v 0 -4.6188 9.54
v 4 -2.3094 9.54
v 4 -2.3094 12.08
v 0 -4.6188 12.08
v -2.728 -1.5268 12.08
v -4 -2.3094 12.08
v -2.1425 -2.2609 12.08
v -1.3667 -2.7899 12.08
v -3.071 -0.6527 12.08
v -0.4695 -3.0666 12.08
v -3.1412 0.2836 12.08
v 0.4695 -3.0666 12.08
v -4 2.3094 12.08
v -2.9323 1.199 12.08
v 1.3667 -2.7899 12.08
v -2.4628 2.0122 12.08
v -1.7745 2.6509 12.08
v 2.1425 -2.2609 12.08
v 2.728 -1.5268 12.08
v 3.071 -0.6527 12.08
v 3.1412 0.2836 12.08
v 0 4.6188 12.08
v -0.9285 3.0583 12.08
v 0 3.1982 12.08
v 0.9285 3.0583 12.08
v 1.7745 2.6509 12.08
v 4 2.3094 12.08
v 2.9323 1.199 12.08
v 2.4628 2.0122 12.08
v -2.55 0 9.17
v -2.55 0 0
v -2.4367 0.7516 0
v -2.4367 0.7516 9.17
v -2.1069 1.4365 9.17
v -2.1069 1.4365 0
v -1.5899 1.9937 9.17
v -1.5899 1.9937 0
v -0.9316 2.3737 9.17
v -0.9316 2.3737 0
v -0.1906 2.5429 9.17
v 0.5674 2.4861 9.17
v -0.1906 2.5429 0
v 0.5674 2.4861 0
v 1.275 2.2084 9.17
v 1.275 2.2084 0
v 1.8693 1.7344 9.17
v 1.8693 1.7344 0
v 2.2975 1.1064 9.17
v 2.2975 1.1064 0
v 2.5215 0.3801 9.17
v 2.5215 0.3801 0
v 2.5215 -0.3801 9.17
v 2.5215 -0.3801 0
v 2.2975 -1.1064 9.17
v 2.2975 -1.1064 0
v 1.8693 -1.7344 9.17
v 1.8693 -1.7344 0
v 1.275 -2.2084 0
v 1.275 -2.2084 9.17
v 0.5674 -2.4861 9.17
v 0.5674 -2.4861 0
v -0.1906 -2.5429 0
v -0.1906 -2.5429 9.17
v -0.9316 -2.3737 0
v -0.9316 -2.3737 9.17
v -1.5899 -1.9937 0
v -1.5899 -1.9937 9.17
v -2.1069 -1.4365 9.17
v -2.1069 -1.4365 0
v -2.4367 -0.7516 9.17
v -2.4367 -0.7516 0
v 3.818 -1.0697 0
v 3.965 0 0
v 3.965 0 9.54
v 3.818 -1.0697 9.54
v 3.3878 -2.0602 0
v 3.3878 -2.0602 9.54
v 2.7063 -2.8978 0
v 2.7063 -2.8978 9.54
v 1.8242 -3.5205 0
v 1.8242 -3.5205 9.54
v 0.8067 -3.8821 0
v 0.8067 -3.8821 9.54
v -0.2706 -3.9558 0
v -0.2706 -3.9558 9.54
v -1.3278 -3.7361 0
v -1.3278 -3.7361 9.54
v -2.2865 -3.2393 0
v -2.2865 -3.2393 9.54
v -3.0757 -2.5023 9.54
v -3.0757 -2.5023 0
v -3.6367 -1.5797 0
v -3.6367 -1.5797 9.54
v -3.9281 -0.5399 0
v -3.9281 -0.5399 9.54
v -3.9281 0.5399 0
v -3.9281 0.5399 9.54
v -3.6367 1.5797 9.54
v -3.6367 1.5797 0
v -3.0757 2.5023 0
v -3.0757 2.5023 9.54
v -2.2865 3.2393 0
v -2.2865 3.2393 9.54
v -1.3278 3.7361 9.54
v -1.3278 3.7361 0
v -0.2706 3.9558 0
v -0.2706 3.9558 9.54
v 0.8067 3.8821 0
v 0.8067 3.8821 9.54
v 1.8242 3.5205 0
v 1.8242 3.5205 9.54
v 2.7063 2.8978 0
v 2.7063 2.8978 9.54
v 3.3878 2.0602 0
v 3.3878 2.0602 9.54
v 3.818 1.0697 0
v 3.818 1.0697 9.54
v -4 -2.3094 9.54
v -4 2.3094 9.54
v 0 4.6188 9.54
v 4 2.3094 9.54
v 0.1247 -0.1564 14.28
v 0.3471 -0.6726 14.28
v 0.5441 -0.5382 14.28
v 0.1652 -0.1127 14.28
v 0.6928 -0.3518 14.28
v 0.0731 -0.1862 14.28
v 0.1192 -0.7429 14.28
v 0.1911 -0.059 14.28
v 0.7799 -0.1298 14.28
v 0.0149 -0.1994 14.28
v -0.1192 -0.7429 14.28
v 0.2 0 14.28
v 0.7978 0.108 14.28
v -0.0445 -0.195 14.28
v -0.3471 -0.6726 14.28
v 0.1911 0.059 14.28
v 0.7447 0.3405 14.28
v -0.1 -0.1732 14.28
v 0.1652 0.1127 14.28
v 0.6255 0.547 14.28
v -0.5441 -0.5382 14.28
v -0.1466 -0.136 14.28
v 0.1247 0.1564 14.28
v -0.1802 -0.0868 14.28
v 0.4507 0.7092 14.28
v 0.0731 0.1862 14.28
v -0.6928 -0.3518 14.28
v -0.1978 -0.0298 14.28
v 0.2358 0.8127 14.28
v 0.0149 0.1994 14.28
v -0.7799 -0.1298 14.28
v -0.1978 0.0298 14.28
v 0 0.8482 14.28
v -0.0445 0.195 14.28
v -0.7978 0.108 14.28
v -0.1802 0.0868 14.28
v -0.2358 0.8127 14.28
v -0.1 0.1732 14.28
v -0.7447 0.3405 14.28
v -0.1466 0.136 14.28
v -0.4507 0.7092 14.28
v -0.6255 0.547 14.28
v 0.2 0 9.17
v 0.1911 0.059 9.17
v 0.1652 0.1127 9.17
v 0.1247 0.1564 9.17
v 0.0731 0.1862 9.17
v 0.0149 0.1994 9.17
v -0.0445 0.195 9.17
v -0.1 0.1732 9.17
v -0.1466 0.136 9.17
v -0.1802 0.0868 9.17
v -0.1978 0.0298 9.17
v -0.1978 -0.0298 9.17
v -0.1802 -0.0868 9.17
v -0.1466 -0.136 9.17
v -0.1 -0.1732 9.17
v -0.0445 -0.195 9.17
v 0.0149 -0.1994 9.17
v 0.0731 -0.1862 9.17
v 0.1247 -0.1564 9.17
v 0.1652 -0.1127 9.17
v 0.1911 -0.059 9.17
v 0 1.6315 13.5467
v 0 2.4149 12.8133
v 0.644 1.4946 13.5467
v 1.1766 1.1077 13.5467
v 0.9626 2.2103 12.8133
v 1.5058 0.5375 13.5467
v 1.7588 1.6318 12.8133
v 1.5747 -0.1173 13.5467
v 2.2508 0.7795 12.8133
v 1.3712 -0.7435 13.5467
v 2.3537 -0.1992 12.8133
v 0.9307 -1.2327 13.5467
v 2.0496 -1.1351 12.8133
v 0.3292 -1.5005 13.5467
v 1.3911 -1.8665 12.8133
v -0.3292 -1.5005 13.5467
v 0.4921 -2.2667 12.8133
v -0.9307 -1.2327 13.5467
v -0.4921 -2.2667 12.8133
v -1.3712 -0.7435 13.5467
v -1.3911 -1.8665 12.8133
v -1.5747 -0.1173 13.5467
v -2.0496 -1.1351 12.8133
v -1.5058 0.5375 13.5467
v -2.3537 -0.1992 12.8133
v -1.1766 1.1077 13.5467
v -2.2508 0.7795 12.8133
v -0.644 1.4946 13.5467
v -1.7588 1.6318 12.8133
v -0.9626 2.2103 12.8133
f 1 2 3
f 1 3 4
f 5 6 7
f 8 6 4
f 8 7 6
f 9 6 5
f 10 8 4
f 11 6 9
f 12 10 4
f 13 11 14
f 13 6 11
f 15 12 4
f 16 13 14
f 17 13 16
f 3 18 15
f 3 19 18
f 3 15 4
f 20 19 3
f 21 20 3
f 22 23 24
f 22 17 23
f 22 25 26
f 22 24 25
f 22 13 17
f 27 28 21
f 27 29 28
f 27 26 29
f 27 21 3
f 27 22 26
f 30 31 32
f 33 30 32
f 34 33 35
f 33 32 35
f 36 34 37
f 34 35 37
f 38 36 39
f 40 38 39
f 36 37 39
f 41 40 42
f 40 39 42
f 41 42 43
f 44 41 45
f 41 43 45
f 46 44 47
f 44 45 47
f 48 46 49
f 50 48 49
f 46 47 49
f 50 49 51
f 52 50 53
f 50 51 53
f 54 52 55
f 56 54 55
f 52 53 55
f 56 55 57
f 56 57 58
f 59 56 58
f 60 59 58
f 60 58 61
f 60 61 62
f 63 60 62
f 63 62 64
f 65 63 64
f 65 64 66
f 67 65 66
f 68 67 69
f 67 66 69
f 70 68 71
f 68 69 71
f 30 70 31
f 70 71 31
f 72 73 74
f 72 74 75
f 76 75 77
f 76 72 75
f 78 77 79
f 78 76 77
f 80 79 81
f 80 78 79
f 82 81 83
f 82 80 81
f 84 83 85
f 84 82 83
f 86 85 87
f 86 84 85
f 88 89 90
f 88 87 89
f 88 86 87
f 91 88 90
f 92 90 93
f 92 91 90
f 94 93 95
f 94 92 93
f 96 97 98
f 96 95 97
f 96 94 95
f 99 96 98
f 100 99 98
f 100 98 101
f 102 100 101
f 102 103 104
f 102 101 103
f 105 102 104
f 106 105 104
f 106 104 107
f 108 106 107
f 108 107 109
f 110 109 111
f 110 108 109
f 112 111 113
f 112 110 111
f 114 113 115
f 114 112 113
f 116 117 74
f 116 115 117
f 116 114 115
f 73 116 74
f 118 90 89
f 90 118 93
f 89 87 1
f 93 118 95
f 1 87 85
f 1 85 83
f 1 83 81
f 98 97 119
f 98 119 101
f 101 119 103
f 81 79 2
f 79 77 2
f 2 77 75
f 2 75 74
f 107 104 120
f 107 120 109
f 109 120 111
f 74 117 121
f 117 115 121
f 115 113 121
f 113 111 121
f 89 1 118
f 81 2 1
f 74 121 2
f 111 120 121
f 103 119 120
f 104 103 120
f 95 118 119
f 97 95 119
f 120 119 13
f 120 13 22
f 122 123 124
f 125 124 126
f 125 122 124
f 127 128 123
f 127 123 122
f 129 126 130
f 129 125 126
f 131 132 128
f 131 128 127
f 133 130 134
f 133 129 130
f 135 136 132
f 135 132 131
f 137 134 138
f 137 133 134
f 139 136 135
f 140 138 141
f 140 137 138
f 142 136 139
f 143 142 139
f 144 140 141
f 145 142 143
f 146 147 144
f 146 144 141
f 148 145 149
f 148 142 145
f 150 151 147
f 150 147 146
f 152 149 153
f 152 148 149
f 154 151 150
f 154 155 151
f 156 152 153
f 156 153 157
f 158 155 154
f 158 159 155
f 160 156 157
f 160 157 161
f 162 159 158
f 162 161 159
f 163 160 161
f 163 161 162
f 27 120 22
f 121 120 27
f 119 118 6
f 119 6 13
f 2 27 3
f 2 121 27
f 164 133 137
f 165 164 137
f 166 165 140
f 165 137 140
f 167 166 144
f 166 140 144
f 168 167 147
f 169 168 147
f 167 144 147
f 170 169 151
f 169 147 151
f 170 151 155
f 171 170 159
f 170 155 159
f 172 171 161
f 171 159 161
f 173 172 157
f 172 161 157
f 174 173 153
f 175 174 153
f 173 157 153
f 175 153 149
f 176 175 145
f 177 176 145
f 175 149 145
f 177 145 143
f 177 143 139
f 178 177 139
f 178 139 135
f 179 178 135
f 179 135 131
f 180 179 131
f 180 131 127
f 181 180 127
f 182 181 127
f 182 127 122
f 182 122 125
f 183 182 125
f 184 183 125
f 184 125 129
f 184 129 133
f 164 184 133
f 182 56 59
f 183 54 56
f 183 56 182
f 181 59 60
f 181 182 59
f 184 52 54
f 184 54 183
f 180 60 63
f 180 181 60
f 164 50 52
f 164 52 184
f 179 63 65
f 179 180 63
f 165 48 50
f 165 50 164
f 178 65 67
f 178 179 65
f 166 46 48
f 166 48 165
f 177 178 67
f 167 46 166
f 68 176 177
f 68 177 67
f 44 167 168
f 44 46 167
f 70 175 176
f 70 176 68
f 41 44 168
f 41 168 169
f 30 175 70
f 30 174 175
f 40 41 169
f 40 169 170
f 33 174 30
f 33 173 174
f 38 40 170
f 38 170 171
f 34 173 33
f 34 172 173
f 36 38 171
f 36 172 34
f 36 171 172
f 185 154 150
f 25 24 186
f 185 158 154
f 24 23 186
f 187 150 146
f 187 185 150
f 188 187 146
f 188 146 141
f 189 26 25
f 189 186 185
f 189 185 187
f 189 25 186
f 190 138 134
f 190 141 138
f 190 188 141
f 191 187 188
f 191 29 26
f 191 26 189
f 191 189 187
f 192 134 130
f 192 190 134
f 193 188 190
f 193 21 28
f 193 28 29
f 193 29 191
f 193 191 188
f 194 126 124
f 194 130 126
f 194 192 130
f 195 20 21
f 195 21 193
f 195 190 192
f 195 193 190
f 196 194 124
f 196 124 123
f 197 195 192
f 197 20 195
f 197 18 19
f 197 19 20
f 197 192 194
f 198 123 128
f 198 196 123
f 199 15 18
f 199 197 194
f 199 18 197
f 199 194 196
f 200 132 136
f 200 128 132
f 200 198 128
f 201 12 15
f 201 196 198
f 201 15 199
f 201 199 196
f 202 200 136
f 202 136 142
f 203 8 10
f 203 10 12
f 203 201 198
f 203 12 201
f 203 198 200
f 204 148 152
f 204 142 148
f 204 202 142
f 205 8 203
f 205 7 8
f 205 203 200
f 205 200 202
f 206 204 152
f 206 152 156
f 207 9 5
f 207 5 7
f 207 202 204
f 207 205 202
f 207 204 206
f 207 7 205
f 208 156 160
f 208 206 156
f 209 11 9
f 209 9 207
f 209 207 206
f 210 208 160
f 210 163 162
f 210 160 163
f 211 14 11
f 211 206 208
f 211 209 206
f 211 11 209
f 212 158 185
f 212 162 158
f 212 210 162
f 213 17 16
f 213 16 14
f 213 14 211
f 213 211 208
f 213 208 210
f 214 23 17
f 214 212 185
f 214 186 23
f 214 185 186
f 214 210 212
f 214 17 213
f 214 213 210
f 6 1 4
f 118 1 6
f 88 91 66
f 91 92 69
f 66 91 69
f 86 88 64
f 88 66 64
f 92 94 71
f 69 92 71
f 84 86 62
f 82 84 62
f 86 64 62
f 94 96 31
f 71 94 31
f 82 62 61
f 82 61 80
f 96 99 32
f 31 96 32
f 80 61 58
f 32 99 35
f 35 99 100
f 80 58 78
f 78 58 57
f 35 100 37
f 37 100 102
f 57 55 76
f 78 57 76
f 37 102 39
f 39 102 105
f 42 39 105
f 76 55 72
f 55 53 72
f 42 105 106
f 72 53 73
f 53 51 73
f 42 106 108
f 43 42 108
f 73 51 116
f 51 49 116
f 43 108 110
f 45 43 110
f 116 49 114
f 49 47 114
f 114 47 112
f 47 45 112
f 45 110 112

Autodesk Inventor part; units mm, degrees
ref_plane "YZ Plane" through (0, 0, 0) normal (1, 0, 0) x (0, 1, 0)
ref_plane "XZ Plane" through (0, 0, 0) normal (0, 1, 0) x (-1, 0, 0)
sketch "Sketch1" plane through (0, 0, 0) normal (0, 0, 1) x (1, 0, 0)
  circle A0 centre (0, 0) radius 3.965
  dimension "d0" = 7.93
extrude "Extrusion1" add sketch "Sketch1" along normal blind 9.54
sketch "Sketch2" plane through (0, 0, 9.54) normal (0, 0, 1) x (1, 0, 0)
  circle A0 centre (0, 0) radius 3.965 projected
  line L0 (0, 4.6188) -> (4, 2.3094)
  line L1 (4, 2.3094) -> (4, -2.3094)
  line L2 (4, -2.3094) -> (0, -4.6188)
  line L3 (0, -4.6188) -> (-4, -2.3094)
  line L4 (-4, -2.3094) -> (-4, 2.3094)
  line L5 (-4, 2.3094) -> (0, 4.6188)
  dimension "d4" = 8
extrude "Extrusion2" add sketch "Sketch2" along normal blind 2.54 contours A0 | L0 L1 L2 L3 L4 L5
ref_plane "Work Plane1" through (0, -2.3094, 9.54) normal (1, 0, 0) x (0, 0, -1)
sketch "Sketch3" plane through (0, -2.3094, 9.54) normal (1, 0, 0) x (0, 0, -1)
  line L0 (-2.54, 2.3576) -> (-4.74, 2.3576)
  line L1 (-4.74, 3.1576) -> (-2.54, 5.5076)
  line L2 (-4.74, 3.1576) -> (-4.74, 2.3576)
  line L3 (-2.54, 0) -> (-2.54, 4.6188) projected
  line L4 (9.54, 2.3094) -> (2.1715, 2.3094)
  line L5 (-2.54, 4.6188) -> (-2.54, 6.9282) projected
  line L6 (-2.54, 5.5076) -> (-2.54, 2.3576)
  point P0 (-2.54, 2.3094)
  dimension "d7" = 3.15
  dimension "d9" = 2.2
  dimension "d10" = 0.8
revolve "Revolution1" add sketch "Sketch3" angle 360 about axis through (0, 0.0482, 12.08) along (0, 0, 1)
sketch "Sketch4" plane through (0, 0.0482, 14.28) normal (0, 0, 1) x (1, 0, 0)
  circle A0 centre (0, -0.0482) radius 0.2
  dimension "d12" = 0.4
extrude "Extrusion3" cut sketch "Sketch4" against normal through all
sketch "Sketch5" plane through (0, 0, 0) normal (0, 0, -1) x (-1, 0, 0)
  circle A0 centre (0, 0) radius 0.2 projected
  circle A1 centre (0, 0) radius 2.55
  point P0 (0, 0)
  dimension "d15" = 5.1
extrude "Extrusion4" cut sketch "Sketch5" against normal blind 9.17 contours A0 | A1
thread "Thread1" size "M5.5x0.5" class "6H" standard "ANSI Metric M Profile" full length
properties part number "nozzel" material "Brass, Soft Yellow"
